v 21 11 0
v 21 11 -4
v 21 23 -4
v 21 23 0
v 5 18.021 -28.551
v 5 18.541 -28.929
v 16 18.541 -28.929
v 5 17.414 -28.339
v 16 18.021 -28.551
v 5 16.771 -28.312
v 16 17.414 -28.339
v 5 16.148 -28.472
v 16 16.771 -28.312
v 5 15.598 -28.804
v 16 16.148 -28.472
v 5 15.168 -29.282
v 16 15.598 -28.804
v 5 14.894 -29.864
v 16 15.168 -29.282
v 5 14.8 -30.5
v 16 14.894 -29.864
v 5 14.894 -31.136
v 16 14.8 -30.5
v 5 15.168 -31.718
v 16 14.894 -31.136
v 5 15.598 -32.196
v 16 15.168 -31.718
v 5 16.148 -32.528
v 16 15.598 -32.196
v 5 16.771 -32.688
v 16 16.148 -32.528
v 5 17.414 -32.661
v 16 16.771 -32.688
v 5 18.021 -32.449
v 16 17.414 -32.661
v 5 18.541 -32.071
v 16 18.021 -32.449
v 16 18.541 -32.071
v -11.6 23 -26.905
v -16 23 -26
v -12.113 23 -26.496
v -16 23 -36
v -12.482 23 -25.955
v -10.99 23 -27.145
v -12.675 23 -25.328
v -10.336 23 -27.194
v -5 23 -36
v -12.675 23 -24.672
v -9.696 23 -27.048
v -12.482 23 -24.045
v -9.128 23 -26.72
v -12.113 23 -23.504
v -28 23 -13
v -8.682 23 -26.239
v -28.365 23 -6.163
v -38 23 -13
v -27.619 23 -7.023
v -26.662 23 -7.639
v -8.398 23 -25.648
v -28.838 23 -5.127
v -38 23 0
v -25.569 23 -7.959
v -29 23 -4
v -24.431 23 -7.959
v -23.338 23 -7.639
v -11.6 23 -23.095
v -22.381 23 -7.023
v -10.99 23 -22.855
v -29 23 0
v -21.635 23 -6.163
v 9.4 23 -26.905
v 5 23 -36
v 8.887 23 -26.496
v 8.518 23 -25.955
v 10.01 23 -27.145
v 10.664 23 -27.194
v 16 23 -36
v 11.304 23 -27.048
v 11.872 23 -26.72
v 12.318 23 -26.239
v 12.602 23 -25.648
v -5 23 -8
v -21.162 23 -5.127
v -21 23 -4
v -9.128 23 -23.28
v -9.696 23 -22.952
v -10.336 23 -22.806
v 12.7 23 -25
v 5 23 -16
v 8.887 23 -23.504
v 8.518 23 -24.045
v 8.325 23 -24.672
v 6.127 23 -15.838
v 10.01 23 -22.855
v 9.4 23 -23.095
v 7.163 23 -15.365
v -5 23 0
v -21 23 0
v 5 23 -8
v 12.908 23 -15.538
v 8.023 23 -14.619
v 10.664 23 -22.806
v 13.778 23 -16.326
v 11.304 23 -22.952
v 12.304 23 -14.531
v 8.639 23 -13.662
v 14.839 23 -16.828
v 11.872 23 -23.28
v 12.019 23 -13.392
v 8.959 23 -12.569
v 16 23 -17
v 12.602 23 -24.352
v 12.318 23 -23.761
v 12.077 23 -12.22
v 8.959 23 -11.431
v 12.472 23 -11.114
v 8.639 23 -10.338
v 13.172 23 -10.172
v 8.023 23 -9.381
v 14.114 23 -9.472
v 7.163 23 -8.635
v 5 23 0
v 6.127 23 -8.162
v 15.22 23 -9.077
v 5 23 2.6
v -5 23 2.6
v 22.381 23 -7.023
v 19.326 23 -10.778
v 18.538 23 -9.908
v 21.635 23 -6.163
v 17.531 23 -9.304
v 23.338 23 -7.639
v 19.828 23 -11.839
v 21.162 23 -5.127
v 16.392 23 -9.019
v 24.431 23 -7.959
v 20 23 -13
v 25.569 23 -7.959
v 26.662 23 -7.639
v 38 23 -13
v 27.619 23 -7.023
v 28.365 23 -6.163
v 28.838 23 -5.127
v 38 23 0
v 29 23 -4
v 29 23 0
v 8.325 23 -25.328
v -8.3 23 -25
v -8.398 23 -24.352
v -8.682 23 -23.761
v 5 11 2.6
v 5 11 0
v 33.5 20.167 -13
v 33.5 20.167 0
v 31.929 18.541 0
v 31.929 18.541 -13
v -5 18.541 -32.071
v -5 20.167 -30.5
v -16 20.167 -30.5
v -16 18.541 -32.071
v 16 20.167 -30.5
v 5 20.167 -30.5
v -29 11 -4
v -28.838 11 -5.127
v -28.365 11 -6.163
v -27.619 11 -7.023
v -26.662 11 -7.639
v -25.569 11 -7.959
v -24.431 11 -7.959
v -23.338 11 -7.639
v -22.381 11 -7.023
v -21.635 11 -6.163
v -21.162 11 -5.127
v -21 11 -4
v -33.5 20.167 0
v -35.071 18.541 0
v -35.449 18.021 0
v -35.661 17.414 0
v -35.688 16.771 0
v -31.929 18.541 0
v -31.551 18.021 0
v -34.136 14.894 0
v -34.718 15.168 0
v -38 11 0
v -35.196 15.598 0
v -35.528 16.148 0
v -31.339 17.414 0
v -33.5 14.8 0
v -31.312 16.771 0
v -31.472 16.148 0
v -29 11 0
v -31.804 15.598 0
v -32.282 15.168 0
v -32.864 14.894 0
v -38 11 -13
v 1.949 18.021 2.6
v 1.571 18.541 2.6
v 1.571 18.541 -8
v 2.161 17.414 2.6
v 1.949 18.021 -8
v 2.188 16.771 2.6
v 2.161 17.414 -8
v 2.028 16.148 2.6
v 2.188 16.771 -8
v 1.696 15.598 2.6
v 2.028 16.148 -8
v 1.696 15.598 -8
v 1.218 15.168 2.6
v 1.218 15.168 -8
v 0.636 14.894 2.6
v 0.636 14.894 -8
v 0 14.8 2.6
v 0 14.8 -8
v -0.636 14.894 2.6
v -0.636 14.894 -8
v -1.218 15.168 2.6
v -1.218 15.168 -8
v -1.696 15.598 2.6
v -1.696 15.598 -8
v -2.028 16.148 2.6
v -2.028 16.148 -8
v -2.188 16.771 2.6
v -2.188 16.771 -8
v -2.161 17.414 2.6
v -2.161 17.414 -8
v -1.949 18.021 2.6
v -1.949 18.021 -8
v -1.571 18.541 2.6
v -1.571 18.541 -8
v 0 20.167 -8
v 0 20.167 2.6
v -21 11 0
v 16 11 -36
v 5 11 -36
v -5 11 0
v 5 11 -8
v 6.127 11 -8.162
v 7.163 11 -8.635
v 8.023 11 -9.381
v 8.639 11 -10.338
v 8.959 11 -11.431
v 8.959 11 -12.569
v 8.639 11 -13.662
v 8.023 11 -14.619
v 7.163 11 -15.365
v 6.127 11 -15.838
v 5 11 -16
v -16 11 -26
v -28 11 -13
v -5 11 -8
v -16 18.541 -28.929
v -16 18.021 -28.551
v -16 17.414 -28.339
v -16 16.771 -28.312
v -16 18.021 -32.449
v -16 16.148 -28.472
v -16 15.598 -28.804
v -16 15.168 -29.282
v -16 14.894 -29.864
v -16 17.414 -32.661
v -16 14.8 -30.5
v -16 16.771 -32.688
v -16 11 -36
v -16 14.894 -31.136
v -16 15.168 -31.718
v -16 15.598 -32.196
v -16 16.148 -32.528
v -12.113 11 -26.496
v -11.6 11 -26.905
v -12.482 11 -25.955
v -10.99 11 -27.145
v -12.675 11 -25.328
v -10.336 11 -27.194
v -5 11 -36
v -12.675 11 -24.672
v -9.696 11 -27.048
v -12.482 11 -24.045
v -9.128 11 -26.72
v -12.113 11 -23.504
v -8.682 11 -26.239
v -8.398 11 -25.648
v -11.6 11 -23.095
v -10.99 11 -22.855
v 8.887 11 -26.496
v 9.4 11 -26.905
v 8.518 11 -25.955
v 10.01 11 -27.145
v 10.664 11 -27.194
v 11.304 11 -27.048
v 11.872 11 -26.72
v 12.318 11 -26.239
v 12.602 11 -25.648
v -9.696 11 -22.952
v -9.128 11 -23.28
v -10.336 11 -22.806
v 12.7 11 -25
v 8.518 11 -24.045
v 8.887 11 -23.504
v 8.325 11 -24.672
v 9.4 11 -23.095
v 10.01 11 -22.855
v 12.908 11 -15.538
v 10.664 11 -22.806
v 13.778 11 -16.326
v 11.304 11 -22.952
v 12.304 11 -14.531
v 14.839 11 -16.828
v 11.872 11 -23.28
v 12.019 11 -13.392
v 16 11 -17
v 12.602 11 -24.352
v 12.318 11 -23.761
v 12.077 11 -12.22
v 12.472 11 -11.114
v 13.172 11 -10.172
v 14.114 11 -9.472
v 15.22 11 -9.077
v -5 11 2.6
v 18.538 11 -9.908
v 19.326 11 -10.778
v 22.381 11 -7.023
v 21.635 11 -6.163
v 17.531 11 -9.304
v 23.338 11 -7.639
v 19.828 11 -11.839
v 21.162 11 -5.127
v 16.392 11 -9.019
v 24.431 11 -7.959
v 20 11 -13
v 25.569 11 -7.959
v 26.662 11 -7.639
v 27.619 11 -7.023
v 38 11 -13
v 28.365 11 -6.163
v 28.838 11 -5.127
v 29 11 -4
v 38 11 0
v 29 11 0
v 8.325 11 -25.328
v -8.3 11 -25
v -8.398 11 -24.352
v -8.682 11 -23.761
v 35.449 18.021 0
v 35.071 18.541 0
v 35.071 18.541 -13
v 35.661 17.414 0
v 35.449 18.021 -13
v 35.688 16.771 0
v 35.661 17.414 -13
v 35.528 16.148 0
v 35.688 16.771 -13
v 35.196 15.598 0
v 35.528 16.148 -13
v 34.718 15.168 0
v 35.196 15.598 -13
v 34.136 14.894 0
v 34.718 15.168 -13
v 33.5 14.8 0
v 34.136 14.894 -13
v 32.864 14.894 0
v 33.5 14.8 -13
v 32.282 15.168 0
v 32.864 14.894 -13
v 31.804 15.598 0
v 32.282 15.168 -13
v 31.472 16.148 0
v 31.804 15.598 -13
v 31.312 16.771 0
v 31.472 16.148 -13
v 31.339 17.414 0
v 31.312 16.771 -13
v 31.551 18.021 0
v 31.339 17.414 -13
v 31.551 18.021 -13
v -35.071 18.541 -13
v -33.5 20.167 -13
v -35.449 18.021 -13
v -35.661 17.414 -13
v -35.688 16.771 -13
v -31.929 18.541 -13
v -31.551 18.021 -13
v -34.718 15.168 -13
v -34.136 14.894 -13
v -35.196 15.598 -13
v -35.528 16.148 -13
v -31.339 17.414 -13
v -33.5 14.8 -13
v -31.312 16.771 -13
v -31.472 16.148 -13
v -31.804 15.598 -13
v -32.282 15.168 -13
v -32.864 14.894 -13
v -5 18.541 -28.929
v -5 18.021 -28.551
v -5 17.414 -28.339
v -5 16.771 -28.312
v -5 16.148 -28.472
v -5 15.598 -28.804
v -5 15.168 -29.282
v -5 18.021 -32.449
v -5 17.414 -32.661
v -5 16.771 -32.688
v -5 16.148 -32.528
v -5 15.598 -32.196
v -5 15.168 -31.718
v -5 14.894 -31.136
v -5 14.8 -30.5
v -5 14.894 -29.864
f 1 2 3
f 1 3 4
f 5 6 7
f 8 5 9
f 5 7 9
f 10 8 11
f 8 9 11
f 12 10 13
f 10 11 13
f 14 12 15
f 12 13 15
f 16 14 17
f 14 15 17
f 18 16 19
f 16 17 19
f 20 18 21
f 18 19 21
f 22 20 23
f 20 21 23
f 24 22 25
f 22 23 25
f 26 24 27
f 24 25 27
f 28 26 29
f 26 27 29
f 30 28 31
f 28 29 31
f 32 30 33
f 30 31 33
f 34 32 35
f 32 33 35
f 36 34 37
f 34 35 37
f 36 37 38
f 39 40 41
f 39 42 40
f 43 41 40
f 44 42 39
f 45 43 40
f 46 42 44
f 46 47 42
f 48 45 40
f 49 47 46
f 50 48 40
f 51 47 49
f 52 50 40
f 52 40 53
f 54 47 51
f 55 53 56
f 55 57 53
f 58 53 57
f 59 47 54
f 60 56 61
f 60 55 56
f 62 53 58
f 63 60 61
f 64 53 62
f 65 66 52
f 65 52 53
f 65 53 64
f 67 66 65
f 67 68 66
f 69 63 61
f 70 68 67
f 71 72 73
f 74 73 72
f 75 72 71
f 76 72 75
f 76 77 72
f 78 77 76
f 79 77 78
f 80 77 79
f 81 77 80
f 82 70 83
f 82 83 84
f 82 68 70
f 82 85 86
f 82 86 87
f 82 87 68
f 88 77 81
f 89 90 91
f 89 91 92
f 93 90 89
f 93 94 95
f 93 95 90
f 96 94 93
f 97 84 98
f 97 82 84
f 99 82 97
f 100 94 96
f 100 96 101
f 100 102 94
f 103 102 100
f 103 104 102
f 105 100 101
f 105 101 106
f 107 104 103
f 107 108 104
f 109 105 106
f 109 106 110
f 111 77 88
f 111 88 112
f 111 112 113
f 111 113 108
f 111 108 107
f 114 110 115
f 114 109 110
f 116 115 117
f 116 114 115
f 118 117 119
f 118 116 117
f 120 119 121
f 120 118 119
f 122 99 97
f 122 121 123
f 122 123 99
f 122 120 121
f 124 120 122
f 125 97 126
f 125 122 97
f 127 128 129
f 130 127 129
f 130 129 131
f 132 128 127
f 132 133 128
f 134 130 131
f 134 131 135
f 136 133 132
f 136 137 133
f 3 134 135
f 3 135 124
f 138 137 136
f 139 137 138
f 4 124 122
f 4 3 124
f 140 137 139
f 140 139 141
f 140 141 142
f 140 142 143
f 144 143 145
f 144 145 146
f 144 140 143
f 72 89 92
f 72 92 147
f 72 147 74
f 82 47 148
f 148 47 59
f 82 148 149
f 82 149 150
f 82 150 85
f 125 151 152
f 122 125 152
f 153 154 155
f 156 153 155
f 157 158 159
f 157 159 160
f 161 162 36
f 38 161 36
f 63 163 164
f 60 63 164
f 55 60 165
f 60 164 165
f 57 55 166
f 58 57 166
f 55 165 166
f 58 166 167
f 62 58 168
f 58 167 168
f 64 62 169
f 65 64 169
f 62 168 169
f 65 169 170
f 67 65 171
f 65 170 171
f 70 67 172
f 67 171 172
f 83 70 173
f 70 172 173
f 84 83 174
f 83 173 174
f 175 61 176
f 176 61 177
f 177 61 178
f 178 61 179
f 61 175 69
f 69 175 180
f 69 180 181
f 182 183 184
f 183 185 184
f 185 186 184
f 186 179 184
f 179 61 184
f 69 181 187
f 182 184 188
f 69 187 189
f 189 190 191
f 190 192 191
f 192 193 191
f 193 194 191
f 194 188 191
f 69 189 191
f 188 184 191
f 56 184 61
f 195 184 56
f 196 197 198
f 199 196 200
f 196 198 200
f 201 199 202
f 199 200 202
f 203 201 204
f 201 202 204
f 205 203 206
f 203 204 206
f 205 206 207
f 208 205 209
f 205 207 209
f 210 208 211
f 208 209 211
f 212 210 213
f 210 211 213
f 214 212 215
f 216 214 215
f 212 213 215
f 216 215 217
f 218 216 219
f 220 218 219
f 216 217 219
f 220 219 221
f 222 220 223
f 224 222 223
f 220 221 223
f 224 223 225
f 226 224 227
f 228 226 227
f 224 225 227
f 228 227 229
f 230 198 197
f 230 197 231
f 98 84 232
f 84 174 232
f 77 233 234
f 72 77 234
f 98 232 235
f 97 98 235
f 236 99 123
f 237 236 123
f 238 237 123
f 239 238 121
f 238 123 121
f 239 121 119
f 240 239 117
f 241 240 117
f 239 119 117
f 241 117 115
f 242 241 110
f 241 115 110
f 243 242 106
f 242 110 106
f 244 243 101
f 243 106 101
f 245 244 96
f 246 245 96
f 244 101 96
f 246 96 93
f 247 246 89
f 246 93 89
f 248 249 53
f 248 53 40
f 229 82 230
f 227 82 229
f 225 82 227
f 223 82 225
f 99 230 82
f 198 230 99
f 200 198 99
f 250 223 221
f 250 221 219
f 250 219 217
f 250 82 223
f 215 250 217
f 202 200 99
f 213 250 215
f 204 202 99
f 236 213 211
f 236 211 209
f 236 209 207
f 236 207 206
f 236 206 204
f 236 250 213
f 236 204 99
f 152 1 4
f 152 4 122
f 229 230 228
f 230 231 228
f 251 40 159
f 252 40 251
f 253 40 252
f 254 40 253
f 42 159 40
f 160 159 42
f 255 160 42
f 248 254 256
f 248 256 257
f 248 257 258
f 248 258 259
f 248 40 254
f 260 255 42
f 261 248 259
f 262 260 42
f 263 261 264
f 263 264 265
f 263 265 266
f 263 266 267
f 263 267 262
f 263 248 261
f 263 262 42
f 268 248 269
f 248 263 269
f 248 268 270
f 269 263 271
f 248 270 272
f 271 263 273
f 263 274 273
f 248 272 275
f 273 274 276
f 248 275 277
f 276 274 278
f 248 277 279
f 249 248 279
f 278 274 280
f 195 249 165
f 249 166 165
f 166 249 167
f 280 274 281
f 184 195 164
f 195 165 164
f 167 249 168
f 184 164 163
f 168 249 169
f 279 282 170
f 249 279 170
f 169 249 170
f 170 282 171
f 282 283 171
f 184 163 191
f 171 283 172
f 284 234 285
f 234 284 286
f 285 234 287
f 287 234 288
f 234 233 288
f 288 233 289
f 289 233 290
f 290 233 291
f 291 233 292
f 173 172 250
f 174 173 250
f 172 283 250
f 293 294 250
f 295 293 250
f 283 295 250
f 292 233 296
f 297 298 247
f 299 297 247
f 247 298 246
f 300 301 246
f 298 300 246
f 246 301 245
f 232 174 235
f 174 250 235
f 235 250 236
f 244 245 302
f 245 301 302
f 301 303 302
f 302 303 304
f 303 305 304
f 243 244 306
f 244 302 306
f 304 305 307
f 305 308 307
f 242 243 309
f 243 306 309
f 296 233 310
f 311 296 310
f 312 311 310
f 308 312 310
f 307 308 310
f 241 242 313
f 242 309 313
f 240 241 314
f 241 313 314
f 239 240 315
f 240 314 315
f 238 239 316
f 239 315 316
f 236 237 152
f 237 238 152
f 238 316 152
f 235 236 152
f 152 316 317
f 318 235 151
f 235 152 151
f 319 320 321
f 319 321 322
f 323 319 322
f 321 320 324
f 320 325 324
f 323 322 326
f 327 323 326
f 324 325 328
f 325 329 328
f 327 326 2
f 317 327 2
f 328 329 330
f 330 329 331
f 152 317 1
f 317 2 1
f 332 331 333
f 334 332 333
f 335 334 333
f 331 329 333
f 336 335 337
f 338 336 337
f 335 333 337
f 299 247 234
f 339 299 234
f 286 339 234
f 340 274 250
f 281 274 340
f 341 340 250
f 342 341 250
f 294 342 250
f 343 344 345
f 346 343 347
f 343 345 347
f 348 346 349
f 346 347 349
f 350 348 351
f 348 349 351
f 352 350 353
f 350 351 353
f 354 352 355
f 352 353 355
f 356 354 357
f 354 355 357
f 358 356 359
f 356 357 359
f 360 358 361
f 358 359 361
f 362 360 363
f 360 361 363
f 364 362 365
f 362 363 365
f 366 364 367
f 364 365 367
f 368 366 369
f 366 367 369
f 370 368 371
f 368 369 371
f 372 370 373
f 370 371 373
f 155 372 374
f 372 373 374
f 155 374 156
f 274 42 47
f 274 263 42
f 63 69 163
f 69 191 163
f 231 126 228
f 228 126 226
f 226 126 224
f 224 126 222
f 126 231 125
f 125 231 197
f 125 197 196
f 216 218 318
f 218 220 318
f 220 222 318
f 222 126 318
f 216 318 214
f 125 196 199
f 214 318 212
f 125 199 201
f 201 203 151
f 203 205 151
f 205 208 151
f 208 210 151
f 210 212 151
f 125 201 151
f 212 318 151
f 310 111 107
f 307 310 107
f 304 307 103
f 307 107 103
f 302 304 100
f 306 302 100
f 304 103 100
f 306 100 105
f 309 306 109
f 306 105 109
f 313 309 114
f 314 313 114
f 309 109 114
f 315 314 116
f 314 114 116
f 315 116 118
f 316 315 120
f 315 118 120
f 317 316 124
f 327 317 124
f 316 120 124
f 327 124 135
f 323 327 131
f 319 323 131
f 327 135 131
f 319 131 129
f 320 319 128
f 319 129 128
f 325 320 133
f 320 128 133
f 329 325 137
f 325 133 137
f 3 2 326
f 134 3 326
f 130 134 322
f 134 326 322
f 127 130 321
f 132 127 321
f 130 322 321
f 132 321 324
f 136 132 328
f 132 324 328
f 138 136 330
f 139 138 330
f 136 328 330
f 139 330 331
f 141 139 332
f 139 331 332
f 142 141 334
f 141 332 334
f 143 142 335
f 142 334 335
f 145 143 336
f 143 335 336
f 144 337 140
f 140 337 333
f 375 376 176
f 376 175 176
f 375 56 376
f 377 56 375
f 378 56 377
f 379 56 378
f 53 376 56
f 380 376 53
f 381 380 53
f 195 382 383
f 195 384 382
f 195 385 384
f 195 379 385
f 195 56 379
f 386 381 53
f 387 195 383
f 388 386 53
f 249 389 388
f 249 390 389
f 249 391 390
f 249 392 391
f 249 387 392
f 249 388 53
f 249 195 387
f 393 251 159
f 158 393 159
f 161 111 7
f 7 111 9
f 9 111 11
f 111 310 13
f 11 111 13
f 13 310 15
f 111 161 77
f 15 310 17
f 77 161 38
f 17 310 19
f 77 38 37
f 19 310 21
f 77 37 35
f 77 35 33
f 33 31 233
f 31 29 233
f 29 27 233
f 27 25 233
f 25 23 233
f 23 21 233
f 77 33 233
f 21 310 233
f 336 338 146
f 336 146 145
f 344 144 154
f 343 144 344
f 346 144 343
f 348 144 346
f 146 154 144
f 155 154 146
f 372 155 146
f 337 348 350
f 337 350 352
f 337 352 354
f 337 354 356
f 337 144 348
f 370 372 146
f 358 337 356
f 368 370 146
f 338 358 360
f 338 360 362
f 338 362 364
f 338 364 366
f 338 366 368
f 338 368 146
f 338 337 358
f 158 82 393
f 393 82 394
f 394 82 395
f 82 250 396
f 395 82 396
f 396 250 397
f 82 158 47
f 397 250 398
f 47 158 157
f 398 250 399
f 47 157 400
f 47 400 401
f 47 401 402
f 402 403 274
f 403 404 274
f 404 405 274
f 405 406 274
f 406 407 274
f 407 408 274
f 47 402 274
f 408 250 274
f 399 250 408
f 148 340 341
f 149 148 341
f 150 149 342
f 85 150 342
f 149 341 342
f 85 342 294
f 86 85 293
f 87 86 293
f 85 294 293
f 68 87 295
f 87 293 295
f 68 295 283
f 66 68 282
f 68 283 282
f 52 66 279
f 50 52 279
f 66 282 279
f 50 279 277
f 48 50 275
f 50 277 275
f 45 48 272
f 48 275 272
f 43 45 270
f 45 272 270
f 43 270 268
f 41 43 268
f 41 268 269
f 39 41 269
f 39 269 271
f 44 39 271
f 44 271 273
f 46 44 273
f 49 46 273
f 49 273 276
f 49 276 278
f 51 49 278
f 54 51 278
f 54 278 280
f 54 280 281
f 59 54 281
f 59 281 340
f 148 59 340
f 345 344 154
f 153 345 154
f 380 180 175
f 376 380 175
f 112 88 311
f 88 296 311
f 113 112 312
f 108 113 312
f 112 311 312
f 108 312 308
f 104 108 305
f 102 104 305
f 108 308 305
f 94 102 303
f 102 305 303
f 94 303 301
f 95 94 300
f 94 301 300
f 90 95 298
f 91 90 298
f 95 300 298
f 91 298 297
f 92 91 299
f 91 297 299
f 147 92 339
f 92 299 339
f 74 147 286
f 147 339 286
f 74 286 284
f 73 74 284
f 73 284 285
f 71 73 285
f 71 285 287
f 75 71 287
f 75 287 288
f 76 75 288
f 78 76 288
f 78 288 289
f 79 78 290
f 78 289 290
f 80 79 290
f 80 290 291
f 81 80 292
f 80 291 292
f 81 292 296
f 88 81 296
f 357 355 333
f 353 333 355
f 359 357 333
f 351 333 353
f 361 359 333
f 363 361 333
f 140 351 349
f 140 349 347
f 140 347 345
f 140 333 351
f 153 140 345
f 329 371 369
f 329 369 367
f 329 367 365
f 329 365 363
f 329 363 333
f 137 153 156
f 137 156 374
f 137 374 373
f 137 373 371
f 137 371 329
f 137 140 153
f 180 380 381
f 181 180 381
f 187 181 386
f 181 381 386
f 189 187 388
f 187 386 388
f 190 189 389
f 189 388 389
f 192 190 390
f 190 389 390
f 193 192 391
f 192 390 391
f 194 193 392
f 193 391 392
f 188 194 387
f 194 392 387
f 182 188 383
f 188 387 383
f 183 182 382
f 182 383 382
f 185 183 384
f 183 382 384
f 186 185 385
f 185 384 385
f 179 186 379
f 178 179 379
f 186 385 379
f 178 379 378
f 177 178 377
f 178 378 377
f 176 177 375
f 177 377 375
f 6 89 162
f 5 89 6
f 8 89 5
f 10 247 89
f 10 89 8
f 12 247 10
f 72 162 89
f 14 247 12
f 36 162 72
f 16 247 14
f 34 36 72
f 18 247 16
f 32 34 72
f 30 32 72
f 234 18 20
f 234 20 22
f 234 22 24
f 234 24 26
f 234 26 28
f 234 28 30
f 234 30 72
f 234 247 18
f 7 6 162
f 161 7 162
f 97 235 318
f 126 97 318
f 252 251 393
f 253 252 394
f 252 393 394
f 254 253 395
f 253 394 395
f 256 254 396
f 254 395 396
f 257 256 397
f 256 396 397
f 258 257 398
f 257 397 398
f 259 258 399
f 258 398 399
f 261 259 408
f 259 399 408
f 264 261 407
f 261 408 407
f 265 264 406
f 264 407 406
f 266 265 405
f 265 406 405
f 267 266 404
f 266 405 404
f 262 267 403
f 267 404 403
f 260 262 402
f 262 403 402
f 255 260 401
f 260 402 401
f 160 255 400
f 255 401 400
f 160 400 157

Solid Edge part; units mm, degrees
sketch "Sketch1" plane through (0, 11, 0) normal (0, -1, 0) x (1, 0, 0)
  circle A0 centre (-10.5, -25) radius 2.2
  circle A1 centre (10.5, -25) radius 2.2
  line L0 (-38, 0) -> (-29, 0)
  line L1 (-29, 0) -> (-29, -4)
  line L2 (-21, -4) -> (-21, 0)
  line L3 (-21, 0) -> (-8, 0)
  line L4 (-8, 0) -> (-5, 0)
  line L5 (-5, 0) -> (-5, 2.6)
  line L6 (-5, 2.6) -> (5, 2.6)
  line L7 (5, 2.6) -> (5, 0)
  line L8 (8, 0) -> (5, 0)
  line L9 (21, 0) -> (8, 0)
  line L10 (21, -4) -> (21, 0)
  arc A2 (21, -4) -> (29, -4) centre (25, -4) ccw
  line L11 (29, 0) -> (29, -4)
  line L12 (38, 0) -> (29, 0)
  line L13 (38, 0) -> (38, -13)
  line L14 (38, -13) -> (28, -13)
  line L15 (28, -13) -> (16, -26)
  line L16 (16, -26) -> (16, -36)
  line L17 (16, -36) -> (5, -36)
  line L18 (5, -8) -> (5, -36)
  line L19 (0, -8) -> (5, -8)
  line L20 (0, -8) -> (-5, -8)
  line L21 (-5, -8) -> (-5, -36)
  line L22 (-16, -36) -> (-5, -36)
  line L23 (-16, -26) -> (-16, -36)
  line L24 (-28, -13) -> (-16, -26)
  line L25 (-38, -13) -> (-28, -13)
  line L26 (-38, 0) -> (-38, -13)
  arc A3 (-29, -4) -> (-21, -4) centre (-25, -4) ccw
  dimension "D1" = 13
  dimension "D2" = 10
  dimension "D3" = 13
  dimension "D4" = 10
extrude "ExtrudedProtrusion_1" add sketch "Sketch1" against normal blind 12
sketch "Sketch2" plane through (0, 17, -8) normal (0, 0, -1) x (1, 0, 0)
  circle A0 centre (0, 0) radius 2.2
extrude "Cutout1" cut sketch "Sketch2" against normal through all
sketch "Sketch3" plane through (33, 17, -13) normal (0, 0, -1) x (-1, 0, 0)
  circle A0 centre (-0.5, 0) radius 2.2
  dimension "D1" = 4.4
extrude "Cutout2" cut sketch "Sketch3" against normal through all
mirror "Mirror1" about plane through (0, 0, 0) normal (1, 0, 0) of "Cutout2"
sketch "Sketch4" plane through (16, 17, -31) normal (1, 0, 0) x (0, -1, 0)
  circle A0 centre (0, -0.5) radius 2.2
  dimension "D1" = 4.4
extrude "Cutout4" cut sketch "Sketch4" against normal through all
sketch "Sketch5" plane through (0, 23, -17.75) normal (0, 1, 0) x (0, 0, 1)
  line L0 (4.75, 16) -> (-17.25, 16)
  line L1 (4.75, 38) -> (4.75, 16)
extrude "Cutout5" cut sketch "Sketch5" against normal through all material side at (16.05, 23, -24)
sketch "Sketch6" plane through (0, 23, -16.75) normal (0, 1, 0) x (1, 0, 0)
  circle A0 centre (5, -4.75) radius 4
  circle A1 centre (16, -3.75) radius 4
extrude "Cutout6" cut sketch "Sketch6" against normal through all
sketch "Sketch7" plane through (0, 17, 2.6) normal (0, 0, 1) x (1, 0, 0)
  line L0 (0, 0) -> (1.5825, 1.5282)
  line L1 (1.5825, 1.5282) -> (0, 3.167)
  line L2 (0, 3.167) -> (-1.5825, 1.5282)
  line L3 (-1.5825, 1.5282) -> (0, 0)
  line L4 (33.5, 0) -> (35.0825, 1.5282)
  line L5 (35.0825, 1.5282) -> (33.5, 3.167)
  line L6 (33.5, 3.167) -> (31.9175, 1.5282)
  line L7 (31.9175, 1.5282) -> (33.5, 0)
  line L8 (-33.5, 0) -> (-31.9175, 1.5282)
  line L9 (-31.9175, 1.5282) -> (-33.5, 3.167)
  line L10 (-33.5, 3.167) -> (-35.0825, 1.5282)
  line L11 (-35.0825, 1.5282) -> (-33.5, 0)
extrude "Cutout7" cut sketch "Sketch7" against normal through all
sketch "Sketch8" plane through (-16, 17, -31) normal (-1, 0, 0) x (0, 0, 1)
  line L0 (0.5, 0) -> (2.0825, 1.5282)
  line L1 (2.0825, 1.5282) -> (0.5, 3.167)
  line L2 (0.5, 3.167) -> (-1.0825, 1.5282)
  line L3 (-1.0825, 1.5282) -> (0.5, 0)
extrude "Cutout8" cut sketch "Sketch8" against normal through all
